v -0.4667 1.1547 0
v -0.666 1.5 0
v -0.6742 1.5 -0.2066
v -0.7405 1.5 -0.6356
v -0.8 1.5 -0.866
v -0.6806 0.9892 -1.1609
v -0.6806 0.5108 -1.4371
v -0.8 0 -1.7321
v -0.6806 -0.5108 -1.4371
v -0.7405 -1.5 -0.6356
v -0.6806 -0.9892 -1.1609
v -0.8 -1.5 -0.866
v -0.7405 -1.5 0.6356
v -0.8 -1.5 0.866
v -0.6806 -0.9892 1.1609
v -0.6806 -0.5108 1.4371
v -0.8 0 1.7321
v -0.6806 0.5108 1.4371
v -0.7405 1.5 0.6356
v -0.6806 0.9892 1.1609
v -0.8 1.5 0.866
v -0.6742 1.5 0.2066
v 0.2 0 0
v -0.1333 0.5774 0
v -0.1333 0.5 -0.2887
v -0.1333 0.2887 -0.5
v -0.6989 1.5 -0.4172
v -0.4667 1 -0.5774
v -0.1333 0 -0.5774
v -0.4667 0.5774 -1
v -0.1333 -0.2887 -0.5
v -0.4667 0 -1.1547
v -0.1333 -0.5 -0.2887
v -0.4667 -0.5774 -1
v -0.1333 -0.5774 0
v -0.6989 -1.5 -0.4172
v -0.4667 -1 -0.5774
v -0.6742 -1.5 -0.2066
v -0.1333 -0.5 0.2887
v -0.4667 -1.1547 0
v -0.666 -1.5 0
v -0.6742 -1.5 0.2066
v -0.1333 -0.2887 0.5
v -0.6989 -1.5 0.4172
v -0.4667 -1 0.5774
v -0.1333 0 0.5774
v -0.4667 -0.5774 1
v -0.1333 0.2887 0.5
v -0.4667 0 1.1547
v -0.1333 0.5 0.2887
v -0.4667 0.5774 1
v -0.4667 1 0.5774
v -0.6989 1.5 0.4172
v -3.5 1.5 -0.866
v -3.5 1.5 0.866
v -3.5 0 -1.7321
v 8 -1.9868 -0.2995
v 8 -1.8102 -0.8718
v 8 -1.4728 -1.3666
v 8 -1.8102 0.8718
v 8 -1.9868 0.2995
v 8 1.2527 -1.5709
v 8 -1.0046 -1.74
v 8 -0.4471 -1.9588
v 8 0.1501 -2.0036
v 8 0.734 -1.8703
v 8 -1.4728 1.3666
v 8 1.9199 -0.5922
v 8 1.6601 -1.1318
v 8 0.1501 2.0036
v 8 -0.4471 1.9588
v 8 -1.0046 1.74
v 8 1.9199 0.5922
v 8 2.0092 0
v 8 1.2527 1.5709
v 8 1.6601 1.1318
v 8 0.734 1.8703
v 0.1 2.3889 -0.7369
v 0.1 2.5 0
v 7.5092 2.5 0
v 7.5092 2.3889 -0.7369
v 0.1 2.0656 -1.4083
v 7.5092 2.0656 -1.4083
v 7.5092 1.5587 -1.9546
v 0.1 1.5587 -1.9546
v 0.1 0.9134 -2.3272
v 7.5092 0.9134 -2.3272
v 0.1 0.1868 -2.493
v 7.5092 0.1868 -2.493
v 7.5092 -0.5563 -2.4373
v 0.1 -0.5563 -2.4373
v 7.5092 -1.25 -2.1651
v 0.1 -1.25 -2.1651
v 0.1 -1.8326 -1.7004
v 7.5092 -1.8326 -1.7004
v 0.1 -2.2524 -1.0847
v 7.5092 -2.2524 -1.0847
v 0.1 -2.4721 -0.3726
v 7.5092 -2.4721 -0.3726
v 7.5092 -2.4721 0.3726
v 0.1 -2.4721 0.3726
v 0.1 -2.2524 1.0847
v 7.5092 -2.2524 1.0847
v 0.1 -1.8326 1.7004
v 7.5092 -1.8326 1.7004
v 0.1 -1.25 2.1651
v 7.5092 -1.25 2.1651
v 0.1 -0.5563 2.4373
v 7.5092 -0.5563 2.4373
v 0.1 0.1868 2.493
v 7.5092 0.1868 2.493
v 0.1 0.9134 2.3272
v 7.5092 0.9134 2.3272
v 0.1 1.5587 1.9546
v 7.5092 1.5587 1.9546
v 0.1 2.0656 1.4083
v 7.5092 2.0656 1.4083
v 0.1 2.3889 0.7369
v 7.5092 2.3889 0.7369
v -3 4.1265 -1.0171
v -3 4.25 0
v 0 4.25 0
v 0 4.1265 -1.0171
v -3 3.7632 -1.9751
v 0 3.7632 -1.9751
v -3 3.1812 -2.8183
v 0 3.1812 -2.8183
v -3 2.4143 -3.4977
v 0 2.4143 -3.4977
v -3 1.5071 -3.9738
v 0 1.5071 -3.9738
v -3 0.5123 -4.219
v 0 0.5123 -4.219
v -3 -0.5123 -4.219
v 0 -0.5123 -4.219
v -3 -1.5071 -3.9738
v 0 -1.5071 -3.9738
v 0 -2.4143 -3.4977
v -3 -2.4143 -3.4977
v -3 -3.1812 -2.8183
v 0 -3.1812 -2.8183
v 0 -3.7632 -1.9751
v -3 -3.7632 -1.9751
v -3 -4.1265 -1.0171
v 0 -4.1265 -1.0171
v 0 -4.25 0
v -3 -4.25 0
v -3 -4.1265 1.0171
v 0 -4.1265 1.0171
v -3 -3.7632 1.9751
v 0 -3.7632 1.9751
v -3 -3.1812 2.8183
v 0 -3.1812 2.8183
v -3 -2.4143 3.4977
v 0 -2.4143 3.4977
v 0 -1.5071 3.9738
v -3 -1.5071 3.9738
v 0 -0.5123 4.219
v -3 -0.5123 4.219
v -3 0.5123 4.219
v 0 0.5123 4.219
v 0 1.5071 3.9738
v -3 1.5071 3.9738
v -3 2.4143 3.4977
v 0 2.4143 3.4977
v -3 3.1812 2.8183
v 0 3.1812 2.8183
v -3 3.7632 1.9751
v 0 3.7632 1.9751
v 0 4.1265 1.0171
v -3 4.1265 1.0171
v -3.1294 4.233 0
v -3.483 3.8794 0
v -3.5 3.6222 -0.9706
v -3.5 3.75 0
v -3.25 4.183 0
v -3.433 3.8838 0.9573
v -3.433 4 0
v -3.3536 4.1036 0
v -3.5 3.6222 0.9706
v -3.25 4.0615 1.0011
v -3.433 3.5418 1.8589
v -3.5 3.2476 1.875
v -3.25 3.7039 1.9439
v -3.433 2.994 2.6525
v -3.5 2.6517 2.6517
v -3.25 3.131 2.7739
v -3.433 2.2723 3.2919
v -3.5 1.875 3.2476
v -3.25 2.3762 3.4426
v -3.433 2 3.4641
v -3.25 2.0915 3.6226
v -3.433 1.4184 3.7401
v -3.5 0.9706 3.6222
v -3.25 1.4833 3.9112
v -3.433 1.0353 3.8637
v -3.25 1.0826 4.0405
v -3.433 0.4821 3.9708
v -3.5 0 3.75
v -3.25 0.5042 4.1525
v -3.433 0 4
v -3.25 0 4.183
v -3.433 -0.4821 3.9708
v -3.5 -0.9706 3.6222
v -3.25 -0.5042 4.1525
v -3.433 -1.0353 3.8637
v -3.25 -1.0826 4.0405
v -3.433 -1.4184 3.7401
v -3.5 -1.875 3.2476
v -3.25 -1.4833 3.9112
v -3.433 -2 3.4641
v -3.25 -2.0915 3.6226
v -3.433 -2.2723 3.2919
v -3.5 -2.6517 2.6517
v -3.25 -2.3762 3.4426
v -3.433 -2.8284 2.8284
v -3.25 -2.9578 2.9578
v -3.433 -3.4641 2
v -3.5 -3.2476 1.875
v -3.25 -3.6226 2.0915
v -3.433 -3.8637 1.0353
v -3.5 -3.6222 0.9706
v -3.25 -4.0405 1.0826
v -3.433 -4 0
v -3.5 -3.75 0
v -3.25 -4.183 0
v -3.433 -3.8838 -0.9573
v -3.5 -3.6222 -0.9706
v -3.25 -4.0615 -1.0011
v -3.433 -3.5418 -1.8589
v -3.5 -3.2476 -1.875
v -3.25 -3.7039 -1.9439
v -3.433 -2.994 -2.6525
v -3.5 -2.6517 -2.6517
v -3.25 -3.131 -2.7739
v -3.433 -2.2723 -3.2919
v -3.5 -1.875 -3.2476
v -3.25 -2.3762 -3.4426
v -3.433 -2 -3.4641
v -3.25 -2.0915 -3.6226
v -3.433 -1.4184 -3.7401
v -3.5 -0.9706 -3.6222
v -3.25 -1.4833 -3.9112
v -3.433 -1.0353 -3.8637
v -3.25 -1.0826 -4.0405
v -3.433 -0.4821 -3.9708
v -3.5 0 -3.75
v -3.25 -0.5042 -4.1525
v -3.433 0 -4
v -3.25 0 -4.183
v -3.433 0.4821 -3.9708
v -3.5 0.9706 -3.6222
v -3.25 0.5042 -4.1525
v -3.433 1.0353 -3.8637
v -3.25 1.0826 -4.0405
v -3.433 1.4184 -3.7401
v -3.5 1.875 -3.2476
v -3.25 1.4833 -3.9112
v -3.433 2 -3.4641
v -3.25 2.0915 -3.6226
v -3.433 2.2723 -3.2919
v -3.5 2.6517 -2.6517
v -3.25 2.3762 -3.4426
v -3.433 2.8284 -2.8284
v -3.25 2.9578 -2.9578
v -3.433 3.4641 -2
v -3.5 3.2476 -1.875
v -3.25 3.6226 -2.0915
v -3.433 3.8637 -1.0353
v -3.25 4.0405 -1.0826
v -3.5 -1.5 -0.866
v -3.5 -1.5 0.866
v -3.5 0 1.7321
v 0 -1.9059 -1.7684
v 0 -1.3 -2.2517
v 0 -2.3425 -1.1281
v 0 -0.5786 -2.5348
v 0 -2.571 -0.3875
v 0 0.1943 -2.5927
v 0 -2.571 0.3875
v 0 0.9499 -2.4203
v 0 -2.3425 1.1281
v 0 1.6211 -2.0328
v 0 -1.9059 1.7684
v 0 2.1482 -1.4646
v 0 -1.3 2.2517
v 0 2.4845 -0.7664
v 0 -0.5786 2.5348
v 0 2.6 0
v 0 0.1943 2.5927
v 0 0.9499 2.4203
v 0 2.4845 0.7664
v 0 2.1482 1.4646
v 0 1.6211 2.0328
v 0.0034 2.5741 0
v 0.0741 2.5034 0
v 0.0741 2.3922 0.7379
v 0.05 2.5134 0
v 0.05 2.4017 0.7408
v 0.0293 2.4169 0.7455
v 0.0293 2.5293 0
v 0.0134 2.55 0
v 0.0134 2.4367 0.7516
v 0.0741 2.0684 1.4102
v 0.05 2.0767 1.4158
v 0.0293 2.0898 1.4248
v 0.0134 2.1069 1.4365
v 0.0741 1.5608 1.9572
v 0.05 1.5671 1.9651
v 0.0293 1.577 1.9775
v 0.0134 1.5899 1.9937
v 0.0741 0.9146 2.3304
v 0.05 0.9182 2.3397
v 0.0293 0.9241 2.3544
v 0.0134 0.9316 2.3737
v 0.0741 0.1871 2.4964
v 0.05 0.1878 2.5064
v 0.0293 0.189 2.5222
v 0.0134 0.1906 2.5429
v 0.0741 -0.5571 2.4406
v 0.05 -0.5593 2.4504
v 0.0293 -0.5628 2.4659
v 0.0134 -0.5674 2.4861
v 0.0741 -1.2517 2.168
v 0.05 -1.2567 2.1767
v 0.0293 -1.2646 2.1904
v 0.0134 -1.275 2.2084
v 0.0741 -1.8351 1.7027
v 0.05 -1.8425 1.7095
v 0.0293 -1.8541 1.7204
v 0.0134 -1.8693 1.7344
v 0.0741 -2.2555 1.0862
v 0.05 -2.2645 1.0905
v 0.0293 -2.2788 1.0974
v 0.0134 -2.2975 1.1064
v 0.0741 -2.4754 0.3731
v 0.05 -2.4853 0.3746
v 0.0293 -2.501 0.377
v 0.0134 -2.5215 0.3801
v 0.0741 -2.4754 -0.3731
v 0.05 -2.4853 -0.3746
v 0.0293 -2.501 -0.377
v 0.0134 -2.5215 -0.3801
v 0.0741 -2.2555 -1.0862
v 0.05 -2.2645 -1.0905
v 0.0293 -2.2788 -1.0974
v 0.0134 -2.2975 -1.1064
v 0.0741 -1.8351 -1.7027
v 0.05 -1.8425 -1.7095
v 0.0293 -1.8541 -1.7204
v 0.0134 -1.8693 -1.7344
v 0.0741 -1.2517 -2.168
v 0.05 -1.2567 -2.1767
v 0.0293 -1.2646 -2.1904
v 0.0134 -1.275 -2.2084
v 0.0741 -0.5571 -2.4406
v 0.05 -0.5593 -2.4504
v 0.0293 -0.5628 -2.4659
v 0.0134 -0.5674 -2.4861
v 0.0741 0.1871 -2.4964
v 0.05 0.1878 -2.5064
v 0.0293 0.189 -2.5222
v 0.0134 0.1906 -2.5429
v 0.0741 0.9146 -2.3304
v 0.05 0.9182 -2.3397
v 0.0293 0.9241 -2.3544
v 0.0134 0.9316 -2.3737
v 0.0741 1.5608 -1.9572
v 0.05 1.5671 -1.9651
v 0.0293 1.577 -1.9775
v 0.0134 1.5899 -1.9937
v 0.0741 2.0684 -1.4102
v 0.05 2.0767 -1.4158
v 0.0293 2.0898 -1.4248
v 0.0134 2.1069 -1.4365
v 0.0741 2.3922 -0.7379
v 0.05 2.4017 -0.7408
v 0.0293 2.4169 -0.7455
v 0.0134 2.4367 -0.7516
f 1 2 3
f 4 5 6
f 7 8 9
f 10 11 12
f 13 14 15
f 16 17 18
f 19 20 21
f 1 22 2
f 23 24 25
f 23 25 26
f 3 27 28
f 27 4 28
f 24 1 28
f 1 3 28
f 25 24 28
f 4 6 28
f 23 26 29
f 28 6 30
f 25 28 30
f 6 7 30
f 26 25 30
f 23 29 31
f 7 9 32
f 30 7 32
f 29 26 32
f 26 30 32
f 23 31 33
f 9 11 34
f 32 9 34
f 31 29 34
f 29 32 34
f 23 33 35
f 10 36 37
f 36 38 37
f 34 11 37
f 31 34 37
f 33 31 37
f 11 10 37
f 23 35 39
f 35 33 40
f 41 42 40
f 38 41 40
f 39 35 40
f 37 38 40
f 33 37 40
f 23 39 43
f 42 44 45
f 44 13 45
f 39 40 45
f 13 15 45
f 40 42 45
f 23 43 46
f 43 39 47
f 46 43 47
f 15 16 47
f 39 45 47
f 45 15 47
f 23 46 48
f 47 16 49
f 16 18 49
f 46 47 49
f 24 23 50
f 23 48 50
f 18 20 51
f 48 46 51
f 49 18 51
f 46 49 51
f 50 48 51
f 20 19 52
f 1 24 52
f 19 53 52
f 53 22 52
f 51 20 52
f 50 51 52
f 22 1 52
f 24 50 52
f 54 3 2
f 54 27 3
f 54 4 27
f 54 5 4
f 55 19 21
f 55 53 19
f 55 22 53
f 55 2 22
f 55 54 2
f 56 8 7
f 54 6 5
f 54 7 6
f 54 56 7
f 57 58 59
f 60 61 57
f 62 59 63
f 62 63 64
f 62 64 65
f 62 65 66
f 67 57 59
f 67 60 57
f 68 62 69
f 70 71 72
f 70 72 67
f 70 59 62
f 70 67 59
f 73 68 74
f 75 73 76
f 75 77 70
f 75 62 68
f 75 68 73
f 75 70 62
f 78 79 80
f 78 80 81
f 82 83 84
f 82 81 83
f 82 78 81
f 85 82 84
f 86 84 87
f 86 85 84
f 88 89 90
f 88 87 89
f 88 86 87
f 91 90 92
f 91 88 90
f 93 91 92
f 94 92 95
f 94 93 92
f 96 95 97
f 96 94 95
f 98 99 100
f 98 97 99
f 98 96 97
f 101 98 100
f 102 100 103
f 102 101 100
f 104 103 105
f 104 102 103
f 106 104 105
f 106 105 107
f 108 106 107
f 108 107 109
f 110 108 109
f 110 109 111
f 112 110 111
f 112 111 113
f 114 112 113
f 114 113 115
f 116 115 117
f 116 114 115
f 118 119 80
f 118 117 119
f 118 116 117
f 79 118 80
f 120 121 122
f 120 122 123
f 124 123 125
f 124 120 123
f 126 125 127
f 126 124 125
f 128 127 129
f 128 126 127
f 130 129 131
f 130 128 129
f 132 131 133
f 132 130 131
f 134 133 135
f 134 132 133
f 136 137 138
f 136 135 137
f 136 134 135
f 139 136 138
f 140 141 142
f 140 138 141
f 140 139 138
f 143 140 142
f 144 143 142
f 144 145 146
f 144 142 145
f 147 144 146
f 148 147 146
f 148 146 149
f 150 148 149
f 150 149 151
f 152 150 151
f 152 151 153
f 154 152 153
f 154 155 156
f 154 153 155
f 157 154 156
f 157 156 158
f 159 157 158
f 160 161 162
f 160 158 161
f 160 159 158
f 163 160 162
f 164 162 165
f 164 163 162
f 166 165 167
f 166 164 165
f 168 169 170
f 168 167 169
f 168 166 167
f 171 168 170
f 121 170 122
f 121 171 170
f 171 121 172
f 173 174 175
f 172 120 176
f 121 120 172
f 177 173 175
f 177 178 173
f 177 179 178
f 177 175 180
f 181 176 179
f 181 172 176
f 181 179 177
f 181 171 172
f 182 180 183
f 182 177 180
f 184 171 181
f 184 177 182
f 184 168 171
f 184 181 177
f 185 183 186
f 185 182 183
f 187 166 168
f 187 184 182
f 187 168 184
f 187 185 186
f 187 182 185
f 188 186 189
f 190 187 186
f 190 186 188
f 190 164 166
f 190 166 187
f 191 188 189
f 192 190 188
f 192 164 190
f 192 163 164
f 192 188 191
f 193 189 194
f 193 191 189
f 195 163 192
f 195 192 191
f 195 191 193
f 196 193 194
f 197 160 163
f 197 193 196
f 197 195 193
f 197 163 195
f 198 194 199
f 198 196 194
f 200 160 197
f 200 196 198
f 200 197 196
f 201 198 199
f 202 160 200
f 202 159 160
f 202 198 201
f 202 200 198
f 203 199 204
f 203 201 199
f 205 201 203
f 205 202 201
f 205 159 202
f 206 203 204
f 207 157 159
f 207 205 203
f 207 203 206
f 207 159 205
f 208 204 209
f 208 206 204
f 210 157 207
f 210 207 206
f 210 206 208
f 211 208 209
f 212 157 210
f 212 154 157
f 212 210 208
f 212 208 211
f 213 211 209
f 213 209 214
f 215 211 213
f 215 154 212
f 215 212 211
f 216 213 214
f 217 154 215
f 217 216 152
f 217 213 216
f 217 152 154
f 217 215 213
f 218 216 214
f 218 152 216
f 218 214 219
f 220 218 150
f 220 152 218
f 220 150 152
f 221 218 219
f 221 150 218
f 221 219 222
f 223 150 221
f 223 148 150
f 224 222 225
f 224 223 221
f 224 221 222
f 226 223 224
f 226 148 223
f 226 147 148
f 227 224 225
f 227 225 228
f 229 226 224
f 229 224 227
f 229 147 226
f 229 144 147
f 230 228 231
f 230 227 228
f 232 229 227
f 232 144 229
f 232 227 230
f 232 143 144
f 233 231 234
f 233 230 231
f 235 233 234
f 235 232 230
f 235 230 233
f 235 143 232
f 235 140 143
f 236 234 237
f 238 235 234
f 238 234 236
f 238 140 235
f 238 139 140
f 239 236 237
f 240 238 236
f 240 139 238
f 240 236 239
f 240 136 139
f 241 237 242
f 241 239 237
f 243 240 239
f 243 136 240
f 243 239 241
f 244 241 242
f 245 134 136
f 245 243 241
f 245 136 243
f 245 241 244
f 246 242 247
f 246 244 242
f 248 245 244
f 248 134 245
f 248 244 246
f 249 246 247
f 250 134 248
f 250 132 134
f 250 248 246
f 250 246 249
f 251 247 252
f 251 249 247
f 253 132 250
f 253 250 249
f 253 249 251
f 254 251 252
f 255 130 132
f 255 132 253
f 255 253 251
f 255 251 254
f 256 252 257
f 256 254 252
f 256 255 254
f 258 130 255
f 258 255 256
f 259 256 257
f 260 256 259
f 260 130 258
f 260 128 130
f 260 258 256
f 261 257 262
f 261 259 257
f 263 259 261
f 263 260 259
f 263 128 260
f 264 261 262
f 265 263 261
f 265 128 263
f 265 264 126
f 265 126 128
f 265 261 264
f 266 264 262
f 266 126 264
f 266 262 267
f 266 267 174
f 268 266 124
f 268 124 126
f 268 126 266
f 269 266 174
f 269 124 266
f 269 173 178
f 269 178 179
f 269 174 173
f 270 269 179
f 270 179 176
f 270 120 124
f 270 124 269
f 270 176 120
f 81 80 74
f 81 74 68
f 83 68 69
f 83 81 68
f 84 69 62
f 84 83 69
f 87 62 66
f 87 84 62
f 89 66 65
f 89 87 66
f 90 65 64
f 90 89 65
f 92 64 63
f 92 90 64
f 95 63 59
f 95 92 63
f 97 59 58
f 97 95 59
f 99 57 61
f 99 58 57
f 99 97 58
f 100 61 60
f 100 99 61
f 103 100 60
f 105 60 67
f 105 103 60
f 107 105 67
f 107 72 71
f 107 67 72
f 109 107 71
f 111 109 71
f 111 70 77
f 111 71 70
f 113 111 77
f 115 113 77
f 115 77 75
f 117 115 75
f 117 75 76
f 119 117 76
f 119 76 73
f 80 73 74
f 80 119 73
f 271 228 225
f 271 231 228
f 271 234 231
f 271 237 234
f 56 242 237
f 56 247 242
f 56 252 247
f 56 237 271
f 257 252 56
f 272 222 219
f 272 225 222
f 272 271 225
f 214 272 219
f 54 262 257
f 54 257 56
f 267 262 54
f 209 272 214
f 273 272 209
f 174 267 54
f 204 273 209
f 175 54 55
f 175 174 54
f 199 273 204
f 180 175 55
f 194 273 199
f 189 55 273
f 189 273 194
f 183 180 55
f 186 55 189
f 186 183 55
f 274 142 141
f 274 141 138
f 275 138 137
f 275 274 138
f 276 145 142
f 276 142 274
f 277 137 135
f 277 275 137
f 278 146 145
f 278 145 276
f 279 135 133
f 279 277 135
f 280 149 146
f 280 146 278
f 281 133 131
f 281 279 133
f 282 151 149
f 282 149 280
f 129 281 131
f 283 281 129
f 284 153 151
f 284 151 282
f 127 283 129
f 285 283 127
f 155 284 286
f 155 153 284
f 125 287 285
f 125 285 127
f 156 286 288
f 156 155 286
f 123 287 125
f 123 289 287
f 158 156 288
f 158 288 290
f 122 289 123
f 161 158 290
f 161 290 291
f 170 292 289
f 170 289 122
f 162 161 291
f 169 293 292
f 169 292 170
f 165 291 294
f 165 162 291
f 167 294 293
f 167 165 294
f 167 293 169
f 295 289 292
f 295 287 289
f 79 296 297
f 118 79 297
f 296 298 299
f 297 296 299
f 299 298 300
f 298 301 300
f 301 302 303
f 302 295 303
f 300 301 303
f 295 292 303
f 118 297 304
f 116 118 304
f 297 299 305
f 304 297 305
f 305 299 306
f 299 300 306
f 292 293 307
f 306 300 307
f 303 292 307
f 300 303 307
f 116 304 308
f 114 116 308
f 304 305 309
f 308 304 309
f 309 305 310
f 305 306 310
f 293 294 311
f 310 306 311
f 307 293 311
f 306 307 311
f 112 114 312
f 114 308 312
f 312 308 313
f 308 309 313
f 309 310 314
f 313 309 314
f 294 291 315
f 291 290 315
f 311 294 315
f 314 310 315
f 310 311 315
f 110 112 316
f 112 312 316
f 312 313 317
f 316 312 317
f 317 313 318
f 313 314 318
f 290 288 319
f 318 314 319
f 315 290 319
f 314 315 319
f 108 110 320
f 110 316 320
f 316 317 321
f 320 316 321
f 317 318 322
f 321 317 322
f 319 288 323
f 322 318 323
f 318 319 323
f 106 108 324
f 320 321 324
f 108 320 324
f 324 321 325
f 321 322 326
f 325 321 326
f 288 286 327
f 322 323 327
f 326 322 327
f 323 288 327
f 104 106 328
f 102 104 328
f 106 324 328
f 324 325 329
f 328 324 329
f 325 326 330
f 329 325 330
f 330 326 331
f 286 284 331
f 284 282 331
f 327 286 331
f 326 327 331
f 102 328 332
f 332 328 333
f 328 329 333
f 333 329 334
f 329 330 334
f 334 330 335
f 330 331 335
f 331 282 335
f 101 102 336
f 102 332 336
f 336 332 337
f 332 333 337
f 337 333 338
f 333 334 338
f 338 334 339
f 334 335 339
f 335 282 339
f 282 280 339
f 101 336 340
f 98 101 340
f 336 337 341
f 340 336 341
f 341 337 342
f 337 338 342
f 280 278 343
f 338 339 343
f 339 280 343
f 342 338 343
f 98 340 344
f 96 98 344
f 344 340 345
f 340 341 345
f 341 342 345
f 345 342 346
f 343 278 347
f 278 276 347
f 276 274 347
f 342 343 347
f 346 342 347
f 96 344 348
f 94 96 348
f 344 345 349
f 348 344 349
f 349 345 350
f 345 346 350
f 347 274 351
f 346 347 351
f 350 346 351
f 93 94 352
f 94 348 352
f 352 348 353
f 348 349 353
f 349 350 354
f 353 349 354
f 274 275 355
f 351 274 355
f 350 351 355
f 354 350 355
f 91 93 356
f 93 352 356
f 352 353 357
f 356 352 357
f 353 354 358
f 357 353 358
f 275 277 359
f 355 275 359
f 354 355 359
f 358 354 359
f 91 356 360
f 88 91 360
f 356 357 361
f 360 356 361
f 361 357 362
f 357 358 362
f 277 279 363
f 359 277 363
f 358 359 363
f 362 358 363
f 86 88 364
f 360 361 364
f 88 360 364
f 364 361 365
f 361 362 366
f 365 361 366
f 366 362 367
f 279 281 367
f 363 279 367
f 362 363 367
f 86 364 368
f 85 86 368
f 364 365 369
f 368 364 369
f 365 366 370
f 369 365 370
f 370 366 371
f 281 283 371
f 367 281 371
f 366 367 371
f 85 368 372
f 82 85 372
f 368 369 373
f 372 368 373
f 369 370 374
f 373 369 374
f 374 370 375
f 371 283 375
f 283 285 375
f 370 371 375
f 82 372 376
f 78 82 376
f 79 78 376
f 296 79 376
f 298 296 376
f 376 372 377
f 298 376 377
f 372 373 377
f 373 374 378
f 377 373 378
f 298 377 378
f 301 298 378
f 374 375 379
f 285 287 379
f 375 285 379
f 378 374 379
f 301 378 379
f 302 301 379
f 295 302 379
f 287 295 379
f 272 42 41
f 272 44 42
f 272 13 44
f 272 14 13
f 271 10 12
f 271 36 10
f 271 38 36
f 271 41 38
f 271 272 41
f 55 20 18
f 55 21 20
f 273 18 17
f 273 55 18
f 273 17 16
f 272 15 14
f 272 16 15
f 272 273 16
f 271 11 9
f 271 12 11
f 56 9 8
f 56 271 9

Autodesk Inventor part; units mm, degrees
ref_plane "YZ Plane" through (0, 0, 0) normal (1, 0, 0) x (0, 1, 0)
ref_plane "XZ Plane" through (0, 0, 0) normal (0, 1, 0) x (-1, 0, 0)
sketch "Skizze1" plane through (0, 0, 0) normal (0, 0, 1) x (1, 0, 0)
  line L0 (0.2, 0) -> (8, 0)
  line L1 (8, 0) -> (8, 2.5)
  line L2 (8, 2.5) -> (2.4, 2.5)
  line L3 (2.4, 2.5) -> (1.9091, 2.5)
  line L4 (1.9091, 2.5) -> (0, 2.5)
  line L5 (0, 2.5) -> (0, 4.25)
  line L6 (0, 4.25) -> (-3.5, 4.25)
  line L7 (-3.5, 4.25) -> (-3.5, 1.7321)
  line L8 (-3.5, 1.7321) -> (-0.8, 1.7321)
  line L9 (-0.8, 1.7321) -> (0.2, 0)
  line L10 (-5.8, 0) -> (10.3, 0) projected
  line L11 (0, -0.85) -> (0, 5.1) projected
  line L12 (2.4, 2.5) -> (0, 2.5) construction
  dimension "d1" = 5.6
  dimension "d2" = 0.4909
  dimension "d3" = 3.5
  dimension "d4" = 2.7
  dimension "d5" = 60
  dimension "d6" = 5
  dimension "d7" = 5
  dimension "d8" = 3.4641
  dimension "d9" = 8.5
  dimension "d26" = 8
revolve "Körper" add sketch "Skizze1" angle 360 about axis through (0.2, 0, 0) along (1, 0, 0) contours L9 L11 L4 L3 L2 L1 L0 | L9 L8 L7 L6 L5 L11
sketch "Skizze2" plane through (-3.5, 0, 0) normal (-1, 0, 0) x (0, 0, 1)
  circle A0 centre (0, 0) radius 1.7321 projected
  line L0 (0, -5.95) -> (0, 5.95) projected
  line L1 (-5.95, 0) -> (5.95, 0) projected
  line L2 (1.7321, 0) -> (0.866, -1.5)
  line L3 (0.866, -1.5) -> (-0.866, -1.5)
  line L4 (-0.866, -1.5) -> (-1.7321, 0)
  line L5 (-1.7321, 0) -> (-0.866, 1.5)
  line L6 (-0.866, 1.5) -> (0.866, 1.5)
  line L7 (0.866, 1.5) -> (1.7321, 0)
extrude "Loch" add sketch "Skizze2" against normal up to next contours L7 A0 | A0 L2 | L6 L0 A0 | A0 L0 L3 | L0 L6 A0 | A0 L3 L0 | L4 A0 | A0 L5
fillet "Rundung1" radius 0.5 1 edges at (-3.5, -4.25, 0)
thread "Gewinde" size "M5x0.8" class "6g" standard "ISO Metric profile" length 5.6
chamfer "Fase1" distance 0.4908 distance2 0.4908 1 edges at (8, -2.5, 0) measured on face at (8, -0.6238, -0.819)
ref_plane "Work Plane1" through (29, 0, 0) normal (0, -1, 0) x (1, 0, 0)
fillet "Fillet2" radius 0.1 1 edges at (0, -2.5, 0)
equation "\"d1\" = GEL"
equation "\"d3\" = KOH"
equation "\"d4\" = INTI"
equation "\"d6\" = GD"
equation "\"d7\" = BDM"
equation "\"d8\" = 1.1547 * SW"
equation "\"d9\" = KOD"
equation "\"d26\" = NLG"
equation "\"d30\" = R"
equation "\"d17\" = RR"
equation "\"d13\" = GEL"
equation "\"d15\" = -0.5 * SPD + 0.5 * GD"
equation "\"d16\" = GUL"
equation "\"GD\" = NND"
equation "\"NLG\" = 8"
equation "\"GEL\" = 5.6"
equation "\"KOD\" = 8.5"
equation "\"KOH\" = 3.5"
equation "\"INTI\" = 2.7"
equation "\"GAL\" = 0.61345 * PTC"
equation "\"GUL\" = 0.61345 * PTC"
equation "\"BDM\" = NND"
equation "\"SW\" = 3"
equation "\"RR\" = 0.5"
equation "\"SPD\" = NND - 1.2269 * PTC"
equation "\"R\" = 0.1"
equation "\"TOA\" = 30deg"
equation "\"GD1\" = THREADDIA - 1.2269 * PTC"
equation "\"THREADDIA\" = 5"
equation "\"FAWI\" = 45deg"
equation "\"ANG\" = 120deg"
equation "\"PTC\" = 0.8"
equation "\"NND\" = 5"
equation "\"E0\" = 1.155 * SW"
properties part number "DIN 7984 - M5 x 8" material "Stahl, weich"
